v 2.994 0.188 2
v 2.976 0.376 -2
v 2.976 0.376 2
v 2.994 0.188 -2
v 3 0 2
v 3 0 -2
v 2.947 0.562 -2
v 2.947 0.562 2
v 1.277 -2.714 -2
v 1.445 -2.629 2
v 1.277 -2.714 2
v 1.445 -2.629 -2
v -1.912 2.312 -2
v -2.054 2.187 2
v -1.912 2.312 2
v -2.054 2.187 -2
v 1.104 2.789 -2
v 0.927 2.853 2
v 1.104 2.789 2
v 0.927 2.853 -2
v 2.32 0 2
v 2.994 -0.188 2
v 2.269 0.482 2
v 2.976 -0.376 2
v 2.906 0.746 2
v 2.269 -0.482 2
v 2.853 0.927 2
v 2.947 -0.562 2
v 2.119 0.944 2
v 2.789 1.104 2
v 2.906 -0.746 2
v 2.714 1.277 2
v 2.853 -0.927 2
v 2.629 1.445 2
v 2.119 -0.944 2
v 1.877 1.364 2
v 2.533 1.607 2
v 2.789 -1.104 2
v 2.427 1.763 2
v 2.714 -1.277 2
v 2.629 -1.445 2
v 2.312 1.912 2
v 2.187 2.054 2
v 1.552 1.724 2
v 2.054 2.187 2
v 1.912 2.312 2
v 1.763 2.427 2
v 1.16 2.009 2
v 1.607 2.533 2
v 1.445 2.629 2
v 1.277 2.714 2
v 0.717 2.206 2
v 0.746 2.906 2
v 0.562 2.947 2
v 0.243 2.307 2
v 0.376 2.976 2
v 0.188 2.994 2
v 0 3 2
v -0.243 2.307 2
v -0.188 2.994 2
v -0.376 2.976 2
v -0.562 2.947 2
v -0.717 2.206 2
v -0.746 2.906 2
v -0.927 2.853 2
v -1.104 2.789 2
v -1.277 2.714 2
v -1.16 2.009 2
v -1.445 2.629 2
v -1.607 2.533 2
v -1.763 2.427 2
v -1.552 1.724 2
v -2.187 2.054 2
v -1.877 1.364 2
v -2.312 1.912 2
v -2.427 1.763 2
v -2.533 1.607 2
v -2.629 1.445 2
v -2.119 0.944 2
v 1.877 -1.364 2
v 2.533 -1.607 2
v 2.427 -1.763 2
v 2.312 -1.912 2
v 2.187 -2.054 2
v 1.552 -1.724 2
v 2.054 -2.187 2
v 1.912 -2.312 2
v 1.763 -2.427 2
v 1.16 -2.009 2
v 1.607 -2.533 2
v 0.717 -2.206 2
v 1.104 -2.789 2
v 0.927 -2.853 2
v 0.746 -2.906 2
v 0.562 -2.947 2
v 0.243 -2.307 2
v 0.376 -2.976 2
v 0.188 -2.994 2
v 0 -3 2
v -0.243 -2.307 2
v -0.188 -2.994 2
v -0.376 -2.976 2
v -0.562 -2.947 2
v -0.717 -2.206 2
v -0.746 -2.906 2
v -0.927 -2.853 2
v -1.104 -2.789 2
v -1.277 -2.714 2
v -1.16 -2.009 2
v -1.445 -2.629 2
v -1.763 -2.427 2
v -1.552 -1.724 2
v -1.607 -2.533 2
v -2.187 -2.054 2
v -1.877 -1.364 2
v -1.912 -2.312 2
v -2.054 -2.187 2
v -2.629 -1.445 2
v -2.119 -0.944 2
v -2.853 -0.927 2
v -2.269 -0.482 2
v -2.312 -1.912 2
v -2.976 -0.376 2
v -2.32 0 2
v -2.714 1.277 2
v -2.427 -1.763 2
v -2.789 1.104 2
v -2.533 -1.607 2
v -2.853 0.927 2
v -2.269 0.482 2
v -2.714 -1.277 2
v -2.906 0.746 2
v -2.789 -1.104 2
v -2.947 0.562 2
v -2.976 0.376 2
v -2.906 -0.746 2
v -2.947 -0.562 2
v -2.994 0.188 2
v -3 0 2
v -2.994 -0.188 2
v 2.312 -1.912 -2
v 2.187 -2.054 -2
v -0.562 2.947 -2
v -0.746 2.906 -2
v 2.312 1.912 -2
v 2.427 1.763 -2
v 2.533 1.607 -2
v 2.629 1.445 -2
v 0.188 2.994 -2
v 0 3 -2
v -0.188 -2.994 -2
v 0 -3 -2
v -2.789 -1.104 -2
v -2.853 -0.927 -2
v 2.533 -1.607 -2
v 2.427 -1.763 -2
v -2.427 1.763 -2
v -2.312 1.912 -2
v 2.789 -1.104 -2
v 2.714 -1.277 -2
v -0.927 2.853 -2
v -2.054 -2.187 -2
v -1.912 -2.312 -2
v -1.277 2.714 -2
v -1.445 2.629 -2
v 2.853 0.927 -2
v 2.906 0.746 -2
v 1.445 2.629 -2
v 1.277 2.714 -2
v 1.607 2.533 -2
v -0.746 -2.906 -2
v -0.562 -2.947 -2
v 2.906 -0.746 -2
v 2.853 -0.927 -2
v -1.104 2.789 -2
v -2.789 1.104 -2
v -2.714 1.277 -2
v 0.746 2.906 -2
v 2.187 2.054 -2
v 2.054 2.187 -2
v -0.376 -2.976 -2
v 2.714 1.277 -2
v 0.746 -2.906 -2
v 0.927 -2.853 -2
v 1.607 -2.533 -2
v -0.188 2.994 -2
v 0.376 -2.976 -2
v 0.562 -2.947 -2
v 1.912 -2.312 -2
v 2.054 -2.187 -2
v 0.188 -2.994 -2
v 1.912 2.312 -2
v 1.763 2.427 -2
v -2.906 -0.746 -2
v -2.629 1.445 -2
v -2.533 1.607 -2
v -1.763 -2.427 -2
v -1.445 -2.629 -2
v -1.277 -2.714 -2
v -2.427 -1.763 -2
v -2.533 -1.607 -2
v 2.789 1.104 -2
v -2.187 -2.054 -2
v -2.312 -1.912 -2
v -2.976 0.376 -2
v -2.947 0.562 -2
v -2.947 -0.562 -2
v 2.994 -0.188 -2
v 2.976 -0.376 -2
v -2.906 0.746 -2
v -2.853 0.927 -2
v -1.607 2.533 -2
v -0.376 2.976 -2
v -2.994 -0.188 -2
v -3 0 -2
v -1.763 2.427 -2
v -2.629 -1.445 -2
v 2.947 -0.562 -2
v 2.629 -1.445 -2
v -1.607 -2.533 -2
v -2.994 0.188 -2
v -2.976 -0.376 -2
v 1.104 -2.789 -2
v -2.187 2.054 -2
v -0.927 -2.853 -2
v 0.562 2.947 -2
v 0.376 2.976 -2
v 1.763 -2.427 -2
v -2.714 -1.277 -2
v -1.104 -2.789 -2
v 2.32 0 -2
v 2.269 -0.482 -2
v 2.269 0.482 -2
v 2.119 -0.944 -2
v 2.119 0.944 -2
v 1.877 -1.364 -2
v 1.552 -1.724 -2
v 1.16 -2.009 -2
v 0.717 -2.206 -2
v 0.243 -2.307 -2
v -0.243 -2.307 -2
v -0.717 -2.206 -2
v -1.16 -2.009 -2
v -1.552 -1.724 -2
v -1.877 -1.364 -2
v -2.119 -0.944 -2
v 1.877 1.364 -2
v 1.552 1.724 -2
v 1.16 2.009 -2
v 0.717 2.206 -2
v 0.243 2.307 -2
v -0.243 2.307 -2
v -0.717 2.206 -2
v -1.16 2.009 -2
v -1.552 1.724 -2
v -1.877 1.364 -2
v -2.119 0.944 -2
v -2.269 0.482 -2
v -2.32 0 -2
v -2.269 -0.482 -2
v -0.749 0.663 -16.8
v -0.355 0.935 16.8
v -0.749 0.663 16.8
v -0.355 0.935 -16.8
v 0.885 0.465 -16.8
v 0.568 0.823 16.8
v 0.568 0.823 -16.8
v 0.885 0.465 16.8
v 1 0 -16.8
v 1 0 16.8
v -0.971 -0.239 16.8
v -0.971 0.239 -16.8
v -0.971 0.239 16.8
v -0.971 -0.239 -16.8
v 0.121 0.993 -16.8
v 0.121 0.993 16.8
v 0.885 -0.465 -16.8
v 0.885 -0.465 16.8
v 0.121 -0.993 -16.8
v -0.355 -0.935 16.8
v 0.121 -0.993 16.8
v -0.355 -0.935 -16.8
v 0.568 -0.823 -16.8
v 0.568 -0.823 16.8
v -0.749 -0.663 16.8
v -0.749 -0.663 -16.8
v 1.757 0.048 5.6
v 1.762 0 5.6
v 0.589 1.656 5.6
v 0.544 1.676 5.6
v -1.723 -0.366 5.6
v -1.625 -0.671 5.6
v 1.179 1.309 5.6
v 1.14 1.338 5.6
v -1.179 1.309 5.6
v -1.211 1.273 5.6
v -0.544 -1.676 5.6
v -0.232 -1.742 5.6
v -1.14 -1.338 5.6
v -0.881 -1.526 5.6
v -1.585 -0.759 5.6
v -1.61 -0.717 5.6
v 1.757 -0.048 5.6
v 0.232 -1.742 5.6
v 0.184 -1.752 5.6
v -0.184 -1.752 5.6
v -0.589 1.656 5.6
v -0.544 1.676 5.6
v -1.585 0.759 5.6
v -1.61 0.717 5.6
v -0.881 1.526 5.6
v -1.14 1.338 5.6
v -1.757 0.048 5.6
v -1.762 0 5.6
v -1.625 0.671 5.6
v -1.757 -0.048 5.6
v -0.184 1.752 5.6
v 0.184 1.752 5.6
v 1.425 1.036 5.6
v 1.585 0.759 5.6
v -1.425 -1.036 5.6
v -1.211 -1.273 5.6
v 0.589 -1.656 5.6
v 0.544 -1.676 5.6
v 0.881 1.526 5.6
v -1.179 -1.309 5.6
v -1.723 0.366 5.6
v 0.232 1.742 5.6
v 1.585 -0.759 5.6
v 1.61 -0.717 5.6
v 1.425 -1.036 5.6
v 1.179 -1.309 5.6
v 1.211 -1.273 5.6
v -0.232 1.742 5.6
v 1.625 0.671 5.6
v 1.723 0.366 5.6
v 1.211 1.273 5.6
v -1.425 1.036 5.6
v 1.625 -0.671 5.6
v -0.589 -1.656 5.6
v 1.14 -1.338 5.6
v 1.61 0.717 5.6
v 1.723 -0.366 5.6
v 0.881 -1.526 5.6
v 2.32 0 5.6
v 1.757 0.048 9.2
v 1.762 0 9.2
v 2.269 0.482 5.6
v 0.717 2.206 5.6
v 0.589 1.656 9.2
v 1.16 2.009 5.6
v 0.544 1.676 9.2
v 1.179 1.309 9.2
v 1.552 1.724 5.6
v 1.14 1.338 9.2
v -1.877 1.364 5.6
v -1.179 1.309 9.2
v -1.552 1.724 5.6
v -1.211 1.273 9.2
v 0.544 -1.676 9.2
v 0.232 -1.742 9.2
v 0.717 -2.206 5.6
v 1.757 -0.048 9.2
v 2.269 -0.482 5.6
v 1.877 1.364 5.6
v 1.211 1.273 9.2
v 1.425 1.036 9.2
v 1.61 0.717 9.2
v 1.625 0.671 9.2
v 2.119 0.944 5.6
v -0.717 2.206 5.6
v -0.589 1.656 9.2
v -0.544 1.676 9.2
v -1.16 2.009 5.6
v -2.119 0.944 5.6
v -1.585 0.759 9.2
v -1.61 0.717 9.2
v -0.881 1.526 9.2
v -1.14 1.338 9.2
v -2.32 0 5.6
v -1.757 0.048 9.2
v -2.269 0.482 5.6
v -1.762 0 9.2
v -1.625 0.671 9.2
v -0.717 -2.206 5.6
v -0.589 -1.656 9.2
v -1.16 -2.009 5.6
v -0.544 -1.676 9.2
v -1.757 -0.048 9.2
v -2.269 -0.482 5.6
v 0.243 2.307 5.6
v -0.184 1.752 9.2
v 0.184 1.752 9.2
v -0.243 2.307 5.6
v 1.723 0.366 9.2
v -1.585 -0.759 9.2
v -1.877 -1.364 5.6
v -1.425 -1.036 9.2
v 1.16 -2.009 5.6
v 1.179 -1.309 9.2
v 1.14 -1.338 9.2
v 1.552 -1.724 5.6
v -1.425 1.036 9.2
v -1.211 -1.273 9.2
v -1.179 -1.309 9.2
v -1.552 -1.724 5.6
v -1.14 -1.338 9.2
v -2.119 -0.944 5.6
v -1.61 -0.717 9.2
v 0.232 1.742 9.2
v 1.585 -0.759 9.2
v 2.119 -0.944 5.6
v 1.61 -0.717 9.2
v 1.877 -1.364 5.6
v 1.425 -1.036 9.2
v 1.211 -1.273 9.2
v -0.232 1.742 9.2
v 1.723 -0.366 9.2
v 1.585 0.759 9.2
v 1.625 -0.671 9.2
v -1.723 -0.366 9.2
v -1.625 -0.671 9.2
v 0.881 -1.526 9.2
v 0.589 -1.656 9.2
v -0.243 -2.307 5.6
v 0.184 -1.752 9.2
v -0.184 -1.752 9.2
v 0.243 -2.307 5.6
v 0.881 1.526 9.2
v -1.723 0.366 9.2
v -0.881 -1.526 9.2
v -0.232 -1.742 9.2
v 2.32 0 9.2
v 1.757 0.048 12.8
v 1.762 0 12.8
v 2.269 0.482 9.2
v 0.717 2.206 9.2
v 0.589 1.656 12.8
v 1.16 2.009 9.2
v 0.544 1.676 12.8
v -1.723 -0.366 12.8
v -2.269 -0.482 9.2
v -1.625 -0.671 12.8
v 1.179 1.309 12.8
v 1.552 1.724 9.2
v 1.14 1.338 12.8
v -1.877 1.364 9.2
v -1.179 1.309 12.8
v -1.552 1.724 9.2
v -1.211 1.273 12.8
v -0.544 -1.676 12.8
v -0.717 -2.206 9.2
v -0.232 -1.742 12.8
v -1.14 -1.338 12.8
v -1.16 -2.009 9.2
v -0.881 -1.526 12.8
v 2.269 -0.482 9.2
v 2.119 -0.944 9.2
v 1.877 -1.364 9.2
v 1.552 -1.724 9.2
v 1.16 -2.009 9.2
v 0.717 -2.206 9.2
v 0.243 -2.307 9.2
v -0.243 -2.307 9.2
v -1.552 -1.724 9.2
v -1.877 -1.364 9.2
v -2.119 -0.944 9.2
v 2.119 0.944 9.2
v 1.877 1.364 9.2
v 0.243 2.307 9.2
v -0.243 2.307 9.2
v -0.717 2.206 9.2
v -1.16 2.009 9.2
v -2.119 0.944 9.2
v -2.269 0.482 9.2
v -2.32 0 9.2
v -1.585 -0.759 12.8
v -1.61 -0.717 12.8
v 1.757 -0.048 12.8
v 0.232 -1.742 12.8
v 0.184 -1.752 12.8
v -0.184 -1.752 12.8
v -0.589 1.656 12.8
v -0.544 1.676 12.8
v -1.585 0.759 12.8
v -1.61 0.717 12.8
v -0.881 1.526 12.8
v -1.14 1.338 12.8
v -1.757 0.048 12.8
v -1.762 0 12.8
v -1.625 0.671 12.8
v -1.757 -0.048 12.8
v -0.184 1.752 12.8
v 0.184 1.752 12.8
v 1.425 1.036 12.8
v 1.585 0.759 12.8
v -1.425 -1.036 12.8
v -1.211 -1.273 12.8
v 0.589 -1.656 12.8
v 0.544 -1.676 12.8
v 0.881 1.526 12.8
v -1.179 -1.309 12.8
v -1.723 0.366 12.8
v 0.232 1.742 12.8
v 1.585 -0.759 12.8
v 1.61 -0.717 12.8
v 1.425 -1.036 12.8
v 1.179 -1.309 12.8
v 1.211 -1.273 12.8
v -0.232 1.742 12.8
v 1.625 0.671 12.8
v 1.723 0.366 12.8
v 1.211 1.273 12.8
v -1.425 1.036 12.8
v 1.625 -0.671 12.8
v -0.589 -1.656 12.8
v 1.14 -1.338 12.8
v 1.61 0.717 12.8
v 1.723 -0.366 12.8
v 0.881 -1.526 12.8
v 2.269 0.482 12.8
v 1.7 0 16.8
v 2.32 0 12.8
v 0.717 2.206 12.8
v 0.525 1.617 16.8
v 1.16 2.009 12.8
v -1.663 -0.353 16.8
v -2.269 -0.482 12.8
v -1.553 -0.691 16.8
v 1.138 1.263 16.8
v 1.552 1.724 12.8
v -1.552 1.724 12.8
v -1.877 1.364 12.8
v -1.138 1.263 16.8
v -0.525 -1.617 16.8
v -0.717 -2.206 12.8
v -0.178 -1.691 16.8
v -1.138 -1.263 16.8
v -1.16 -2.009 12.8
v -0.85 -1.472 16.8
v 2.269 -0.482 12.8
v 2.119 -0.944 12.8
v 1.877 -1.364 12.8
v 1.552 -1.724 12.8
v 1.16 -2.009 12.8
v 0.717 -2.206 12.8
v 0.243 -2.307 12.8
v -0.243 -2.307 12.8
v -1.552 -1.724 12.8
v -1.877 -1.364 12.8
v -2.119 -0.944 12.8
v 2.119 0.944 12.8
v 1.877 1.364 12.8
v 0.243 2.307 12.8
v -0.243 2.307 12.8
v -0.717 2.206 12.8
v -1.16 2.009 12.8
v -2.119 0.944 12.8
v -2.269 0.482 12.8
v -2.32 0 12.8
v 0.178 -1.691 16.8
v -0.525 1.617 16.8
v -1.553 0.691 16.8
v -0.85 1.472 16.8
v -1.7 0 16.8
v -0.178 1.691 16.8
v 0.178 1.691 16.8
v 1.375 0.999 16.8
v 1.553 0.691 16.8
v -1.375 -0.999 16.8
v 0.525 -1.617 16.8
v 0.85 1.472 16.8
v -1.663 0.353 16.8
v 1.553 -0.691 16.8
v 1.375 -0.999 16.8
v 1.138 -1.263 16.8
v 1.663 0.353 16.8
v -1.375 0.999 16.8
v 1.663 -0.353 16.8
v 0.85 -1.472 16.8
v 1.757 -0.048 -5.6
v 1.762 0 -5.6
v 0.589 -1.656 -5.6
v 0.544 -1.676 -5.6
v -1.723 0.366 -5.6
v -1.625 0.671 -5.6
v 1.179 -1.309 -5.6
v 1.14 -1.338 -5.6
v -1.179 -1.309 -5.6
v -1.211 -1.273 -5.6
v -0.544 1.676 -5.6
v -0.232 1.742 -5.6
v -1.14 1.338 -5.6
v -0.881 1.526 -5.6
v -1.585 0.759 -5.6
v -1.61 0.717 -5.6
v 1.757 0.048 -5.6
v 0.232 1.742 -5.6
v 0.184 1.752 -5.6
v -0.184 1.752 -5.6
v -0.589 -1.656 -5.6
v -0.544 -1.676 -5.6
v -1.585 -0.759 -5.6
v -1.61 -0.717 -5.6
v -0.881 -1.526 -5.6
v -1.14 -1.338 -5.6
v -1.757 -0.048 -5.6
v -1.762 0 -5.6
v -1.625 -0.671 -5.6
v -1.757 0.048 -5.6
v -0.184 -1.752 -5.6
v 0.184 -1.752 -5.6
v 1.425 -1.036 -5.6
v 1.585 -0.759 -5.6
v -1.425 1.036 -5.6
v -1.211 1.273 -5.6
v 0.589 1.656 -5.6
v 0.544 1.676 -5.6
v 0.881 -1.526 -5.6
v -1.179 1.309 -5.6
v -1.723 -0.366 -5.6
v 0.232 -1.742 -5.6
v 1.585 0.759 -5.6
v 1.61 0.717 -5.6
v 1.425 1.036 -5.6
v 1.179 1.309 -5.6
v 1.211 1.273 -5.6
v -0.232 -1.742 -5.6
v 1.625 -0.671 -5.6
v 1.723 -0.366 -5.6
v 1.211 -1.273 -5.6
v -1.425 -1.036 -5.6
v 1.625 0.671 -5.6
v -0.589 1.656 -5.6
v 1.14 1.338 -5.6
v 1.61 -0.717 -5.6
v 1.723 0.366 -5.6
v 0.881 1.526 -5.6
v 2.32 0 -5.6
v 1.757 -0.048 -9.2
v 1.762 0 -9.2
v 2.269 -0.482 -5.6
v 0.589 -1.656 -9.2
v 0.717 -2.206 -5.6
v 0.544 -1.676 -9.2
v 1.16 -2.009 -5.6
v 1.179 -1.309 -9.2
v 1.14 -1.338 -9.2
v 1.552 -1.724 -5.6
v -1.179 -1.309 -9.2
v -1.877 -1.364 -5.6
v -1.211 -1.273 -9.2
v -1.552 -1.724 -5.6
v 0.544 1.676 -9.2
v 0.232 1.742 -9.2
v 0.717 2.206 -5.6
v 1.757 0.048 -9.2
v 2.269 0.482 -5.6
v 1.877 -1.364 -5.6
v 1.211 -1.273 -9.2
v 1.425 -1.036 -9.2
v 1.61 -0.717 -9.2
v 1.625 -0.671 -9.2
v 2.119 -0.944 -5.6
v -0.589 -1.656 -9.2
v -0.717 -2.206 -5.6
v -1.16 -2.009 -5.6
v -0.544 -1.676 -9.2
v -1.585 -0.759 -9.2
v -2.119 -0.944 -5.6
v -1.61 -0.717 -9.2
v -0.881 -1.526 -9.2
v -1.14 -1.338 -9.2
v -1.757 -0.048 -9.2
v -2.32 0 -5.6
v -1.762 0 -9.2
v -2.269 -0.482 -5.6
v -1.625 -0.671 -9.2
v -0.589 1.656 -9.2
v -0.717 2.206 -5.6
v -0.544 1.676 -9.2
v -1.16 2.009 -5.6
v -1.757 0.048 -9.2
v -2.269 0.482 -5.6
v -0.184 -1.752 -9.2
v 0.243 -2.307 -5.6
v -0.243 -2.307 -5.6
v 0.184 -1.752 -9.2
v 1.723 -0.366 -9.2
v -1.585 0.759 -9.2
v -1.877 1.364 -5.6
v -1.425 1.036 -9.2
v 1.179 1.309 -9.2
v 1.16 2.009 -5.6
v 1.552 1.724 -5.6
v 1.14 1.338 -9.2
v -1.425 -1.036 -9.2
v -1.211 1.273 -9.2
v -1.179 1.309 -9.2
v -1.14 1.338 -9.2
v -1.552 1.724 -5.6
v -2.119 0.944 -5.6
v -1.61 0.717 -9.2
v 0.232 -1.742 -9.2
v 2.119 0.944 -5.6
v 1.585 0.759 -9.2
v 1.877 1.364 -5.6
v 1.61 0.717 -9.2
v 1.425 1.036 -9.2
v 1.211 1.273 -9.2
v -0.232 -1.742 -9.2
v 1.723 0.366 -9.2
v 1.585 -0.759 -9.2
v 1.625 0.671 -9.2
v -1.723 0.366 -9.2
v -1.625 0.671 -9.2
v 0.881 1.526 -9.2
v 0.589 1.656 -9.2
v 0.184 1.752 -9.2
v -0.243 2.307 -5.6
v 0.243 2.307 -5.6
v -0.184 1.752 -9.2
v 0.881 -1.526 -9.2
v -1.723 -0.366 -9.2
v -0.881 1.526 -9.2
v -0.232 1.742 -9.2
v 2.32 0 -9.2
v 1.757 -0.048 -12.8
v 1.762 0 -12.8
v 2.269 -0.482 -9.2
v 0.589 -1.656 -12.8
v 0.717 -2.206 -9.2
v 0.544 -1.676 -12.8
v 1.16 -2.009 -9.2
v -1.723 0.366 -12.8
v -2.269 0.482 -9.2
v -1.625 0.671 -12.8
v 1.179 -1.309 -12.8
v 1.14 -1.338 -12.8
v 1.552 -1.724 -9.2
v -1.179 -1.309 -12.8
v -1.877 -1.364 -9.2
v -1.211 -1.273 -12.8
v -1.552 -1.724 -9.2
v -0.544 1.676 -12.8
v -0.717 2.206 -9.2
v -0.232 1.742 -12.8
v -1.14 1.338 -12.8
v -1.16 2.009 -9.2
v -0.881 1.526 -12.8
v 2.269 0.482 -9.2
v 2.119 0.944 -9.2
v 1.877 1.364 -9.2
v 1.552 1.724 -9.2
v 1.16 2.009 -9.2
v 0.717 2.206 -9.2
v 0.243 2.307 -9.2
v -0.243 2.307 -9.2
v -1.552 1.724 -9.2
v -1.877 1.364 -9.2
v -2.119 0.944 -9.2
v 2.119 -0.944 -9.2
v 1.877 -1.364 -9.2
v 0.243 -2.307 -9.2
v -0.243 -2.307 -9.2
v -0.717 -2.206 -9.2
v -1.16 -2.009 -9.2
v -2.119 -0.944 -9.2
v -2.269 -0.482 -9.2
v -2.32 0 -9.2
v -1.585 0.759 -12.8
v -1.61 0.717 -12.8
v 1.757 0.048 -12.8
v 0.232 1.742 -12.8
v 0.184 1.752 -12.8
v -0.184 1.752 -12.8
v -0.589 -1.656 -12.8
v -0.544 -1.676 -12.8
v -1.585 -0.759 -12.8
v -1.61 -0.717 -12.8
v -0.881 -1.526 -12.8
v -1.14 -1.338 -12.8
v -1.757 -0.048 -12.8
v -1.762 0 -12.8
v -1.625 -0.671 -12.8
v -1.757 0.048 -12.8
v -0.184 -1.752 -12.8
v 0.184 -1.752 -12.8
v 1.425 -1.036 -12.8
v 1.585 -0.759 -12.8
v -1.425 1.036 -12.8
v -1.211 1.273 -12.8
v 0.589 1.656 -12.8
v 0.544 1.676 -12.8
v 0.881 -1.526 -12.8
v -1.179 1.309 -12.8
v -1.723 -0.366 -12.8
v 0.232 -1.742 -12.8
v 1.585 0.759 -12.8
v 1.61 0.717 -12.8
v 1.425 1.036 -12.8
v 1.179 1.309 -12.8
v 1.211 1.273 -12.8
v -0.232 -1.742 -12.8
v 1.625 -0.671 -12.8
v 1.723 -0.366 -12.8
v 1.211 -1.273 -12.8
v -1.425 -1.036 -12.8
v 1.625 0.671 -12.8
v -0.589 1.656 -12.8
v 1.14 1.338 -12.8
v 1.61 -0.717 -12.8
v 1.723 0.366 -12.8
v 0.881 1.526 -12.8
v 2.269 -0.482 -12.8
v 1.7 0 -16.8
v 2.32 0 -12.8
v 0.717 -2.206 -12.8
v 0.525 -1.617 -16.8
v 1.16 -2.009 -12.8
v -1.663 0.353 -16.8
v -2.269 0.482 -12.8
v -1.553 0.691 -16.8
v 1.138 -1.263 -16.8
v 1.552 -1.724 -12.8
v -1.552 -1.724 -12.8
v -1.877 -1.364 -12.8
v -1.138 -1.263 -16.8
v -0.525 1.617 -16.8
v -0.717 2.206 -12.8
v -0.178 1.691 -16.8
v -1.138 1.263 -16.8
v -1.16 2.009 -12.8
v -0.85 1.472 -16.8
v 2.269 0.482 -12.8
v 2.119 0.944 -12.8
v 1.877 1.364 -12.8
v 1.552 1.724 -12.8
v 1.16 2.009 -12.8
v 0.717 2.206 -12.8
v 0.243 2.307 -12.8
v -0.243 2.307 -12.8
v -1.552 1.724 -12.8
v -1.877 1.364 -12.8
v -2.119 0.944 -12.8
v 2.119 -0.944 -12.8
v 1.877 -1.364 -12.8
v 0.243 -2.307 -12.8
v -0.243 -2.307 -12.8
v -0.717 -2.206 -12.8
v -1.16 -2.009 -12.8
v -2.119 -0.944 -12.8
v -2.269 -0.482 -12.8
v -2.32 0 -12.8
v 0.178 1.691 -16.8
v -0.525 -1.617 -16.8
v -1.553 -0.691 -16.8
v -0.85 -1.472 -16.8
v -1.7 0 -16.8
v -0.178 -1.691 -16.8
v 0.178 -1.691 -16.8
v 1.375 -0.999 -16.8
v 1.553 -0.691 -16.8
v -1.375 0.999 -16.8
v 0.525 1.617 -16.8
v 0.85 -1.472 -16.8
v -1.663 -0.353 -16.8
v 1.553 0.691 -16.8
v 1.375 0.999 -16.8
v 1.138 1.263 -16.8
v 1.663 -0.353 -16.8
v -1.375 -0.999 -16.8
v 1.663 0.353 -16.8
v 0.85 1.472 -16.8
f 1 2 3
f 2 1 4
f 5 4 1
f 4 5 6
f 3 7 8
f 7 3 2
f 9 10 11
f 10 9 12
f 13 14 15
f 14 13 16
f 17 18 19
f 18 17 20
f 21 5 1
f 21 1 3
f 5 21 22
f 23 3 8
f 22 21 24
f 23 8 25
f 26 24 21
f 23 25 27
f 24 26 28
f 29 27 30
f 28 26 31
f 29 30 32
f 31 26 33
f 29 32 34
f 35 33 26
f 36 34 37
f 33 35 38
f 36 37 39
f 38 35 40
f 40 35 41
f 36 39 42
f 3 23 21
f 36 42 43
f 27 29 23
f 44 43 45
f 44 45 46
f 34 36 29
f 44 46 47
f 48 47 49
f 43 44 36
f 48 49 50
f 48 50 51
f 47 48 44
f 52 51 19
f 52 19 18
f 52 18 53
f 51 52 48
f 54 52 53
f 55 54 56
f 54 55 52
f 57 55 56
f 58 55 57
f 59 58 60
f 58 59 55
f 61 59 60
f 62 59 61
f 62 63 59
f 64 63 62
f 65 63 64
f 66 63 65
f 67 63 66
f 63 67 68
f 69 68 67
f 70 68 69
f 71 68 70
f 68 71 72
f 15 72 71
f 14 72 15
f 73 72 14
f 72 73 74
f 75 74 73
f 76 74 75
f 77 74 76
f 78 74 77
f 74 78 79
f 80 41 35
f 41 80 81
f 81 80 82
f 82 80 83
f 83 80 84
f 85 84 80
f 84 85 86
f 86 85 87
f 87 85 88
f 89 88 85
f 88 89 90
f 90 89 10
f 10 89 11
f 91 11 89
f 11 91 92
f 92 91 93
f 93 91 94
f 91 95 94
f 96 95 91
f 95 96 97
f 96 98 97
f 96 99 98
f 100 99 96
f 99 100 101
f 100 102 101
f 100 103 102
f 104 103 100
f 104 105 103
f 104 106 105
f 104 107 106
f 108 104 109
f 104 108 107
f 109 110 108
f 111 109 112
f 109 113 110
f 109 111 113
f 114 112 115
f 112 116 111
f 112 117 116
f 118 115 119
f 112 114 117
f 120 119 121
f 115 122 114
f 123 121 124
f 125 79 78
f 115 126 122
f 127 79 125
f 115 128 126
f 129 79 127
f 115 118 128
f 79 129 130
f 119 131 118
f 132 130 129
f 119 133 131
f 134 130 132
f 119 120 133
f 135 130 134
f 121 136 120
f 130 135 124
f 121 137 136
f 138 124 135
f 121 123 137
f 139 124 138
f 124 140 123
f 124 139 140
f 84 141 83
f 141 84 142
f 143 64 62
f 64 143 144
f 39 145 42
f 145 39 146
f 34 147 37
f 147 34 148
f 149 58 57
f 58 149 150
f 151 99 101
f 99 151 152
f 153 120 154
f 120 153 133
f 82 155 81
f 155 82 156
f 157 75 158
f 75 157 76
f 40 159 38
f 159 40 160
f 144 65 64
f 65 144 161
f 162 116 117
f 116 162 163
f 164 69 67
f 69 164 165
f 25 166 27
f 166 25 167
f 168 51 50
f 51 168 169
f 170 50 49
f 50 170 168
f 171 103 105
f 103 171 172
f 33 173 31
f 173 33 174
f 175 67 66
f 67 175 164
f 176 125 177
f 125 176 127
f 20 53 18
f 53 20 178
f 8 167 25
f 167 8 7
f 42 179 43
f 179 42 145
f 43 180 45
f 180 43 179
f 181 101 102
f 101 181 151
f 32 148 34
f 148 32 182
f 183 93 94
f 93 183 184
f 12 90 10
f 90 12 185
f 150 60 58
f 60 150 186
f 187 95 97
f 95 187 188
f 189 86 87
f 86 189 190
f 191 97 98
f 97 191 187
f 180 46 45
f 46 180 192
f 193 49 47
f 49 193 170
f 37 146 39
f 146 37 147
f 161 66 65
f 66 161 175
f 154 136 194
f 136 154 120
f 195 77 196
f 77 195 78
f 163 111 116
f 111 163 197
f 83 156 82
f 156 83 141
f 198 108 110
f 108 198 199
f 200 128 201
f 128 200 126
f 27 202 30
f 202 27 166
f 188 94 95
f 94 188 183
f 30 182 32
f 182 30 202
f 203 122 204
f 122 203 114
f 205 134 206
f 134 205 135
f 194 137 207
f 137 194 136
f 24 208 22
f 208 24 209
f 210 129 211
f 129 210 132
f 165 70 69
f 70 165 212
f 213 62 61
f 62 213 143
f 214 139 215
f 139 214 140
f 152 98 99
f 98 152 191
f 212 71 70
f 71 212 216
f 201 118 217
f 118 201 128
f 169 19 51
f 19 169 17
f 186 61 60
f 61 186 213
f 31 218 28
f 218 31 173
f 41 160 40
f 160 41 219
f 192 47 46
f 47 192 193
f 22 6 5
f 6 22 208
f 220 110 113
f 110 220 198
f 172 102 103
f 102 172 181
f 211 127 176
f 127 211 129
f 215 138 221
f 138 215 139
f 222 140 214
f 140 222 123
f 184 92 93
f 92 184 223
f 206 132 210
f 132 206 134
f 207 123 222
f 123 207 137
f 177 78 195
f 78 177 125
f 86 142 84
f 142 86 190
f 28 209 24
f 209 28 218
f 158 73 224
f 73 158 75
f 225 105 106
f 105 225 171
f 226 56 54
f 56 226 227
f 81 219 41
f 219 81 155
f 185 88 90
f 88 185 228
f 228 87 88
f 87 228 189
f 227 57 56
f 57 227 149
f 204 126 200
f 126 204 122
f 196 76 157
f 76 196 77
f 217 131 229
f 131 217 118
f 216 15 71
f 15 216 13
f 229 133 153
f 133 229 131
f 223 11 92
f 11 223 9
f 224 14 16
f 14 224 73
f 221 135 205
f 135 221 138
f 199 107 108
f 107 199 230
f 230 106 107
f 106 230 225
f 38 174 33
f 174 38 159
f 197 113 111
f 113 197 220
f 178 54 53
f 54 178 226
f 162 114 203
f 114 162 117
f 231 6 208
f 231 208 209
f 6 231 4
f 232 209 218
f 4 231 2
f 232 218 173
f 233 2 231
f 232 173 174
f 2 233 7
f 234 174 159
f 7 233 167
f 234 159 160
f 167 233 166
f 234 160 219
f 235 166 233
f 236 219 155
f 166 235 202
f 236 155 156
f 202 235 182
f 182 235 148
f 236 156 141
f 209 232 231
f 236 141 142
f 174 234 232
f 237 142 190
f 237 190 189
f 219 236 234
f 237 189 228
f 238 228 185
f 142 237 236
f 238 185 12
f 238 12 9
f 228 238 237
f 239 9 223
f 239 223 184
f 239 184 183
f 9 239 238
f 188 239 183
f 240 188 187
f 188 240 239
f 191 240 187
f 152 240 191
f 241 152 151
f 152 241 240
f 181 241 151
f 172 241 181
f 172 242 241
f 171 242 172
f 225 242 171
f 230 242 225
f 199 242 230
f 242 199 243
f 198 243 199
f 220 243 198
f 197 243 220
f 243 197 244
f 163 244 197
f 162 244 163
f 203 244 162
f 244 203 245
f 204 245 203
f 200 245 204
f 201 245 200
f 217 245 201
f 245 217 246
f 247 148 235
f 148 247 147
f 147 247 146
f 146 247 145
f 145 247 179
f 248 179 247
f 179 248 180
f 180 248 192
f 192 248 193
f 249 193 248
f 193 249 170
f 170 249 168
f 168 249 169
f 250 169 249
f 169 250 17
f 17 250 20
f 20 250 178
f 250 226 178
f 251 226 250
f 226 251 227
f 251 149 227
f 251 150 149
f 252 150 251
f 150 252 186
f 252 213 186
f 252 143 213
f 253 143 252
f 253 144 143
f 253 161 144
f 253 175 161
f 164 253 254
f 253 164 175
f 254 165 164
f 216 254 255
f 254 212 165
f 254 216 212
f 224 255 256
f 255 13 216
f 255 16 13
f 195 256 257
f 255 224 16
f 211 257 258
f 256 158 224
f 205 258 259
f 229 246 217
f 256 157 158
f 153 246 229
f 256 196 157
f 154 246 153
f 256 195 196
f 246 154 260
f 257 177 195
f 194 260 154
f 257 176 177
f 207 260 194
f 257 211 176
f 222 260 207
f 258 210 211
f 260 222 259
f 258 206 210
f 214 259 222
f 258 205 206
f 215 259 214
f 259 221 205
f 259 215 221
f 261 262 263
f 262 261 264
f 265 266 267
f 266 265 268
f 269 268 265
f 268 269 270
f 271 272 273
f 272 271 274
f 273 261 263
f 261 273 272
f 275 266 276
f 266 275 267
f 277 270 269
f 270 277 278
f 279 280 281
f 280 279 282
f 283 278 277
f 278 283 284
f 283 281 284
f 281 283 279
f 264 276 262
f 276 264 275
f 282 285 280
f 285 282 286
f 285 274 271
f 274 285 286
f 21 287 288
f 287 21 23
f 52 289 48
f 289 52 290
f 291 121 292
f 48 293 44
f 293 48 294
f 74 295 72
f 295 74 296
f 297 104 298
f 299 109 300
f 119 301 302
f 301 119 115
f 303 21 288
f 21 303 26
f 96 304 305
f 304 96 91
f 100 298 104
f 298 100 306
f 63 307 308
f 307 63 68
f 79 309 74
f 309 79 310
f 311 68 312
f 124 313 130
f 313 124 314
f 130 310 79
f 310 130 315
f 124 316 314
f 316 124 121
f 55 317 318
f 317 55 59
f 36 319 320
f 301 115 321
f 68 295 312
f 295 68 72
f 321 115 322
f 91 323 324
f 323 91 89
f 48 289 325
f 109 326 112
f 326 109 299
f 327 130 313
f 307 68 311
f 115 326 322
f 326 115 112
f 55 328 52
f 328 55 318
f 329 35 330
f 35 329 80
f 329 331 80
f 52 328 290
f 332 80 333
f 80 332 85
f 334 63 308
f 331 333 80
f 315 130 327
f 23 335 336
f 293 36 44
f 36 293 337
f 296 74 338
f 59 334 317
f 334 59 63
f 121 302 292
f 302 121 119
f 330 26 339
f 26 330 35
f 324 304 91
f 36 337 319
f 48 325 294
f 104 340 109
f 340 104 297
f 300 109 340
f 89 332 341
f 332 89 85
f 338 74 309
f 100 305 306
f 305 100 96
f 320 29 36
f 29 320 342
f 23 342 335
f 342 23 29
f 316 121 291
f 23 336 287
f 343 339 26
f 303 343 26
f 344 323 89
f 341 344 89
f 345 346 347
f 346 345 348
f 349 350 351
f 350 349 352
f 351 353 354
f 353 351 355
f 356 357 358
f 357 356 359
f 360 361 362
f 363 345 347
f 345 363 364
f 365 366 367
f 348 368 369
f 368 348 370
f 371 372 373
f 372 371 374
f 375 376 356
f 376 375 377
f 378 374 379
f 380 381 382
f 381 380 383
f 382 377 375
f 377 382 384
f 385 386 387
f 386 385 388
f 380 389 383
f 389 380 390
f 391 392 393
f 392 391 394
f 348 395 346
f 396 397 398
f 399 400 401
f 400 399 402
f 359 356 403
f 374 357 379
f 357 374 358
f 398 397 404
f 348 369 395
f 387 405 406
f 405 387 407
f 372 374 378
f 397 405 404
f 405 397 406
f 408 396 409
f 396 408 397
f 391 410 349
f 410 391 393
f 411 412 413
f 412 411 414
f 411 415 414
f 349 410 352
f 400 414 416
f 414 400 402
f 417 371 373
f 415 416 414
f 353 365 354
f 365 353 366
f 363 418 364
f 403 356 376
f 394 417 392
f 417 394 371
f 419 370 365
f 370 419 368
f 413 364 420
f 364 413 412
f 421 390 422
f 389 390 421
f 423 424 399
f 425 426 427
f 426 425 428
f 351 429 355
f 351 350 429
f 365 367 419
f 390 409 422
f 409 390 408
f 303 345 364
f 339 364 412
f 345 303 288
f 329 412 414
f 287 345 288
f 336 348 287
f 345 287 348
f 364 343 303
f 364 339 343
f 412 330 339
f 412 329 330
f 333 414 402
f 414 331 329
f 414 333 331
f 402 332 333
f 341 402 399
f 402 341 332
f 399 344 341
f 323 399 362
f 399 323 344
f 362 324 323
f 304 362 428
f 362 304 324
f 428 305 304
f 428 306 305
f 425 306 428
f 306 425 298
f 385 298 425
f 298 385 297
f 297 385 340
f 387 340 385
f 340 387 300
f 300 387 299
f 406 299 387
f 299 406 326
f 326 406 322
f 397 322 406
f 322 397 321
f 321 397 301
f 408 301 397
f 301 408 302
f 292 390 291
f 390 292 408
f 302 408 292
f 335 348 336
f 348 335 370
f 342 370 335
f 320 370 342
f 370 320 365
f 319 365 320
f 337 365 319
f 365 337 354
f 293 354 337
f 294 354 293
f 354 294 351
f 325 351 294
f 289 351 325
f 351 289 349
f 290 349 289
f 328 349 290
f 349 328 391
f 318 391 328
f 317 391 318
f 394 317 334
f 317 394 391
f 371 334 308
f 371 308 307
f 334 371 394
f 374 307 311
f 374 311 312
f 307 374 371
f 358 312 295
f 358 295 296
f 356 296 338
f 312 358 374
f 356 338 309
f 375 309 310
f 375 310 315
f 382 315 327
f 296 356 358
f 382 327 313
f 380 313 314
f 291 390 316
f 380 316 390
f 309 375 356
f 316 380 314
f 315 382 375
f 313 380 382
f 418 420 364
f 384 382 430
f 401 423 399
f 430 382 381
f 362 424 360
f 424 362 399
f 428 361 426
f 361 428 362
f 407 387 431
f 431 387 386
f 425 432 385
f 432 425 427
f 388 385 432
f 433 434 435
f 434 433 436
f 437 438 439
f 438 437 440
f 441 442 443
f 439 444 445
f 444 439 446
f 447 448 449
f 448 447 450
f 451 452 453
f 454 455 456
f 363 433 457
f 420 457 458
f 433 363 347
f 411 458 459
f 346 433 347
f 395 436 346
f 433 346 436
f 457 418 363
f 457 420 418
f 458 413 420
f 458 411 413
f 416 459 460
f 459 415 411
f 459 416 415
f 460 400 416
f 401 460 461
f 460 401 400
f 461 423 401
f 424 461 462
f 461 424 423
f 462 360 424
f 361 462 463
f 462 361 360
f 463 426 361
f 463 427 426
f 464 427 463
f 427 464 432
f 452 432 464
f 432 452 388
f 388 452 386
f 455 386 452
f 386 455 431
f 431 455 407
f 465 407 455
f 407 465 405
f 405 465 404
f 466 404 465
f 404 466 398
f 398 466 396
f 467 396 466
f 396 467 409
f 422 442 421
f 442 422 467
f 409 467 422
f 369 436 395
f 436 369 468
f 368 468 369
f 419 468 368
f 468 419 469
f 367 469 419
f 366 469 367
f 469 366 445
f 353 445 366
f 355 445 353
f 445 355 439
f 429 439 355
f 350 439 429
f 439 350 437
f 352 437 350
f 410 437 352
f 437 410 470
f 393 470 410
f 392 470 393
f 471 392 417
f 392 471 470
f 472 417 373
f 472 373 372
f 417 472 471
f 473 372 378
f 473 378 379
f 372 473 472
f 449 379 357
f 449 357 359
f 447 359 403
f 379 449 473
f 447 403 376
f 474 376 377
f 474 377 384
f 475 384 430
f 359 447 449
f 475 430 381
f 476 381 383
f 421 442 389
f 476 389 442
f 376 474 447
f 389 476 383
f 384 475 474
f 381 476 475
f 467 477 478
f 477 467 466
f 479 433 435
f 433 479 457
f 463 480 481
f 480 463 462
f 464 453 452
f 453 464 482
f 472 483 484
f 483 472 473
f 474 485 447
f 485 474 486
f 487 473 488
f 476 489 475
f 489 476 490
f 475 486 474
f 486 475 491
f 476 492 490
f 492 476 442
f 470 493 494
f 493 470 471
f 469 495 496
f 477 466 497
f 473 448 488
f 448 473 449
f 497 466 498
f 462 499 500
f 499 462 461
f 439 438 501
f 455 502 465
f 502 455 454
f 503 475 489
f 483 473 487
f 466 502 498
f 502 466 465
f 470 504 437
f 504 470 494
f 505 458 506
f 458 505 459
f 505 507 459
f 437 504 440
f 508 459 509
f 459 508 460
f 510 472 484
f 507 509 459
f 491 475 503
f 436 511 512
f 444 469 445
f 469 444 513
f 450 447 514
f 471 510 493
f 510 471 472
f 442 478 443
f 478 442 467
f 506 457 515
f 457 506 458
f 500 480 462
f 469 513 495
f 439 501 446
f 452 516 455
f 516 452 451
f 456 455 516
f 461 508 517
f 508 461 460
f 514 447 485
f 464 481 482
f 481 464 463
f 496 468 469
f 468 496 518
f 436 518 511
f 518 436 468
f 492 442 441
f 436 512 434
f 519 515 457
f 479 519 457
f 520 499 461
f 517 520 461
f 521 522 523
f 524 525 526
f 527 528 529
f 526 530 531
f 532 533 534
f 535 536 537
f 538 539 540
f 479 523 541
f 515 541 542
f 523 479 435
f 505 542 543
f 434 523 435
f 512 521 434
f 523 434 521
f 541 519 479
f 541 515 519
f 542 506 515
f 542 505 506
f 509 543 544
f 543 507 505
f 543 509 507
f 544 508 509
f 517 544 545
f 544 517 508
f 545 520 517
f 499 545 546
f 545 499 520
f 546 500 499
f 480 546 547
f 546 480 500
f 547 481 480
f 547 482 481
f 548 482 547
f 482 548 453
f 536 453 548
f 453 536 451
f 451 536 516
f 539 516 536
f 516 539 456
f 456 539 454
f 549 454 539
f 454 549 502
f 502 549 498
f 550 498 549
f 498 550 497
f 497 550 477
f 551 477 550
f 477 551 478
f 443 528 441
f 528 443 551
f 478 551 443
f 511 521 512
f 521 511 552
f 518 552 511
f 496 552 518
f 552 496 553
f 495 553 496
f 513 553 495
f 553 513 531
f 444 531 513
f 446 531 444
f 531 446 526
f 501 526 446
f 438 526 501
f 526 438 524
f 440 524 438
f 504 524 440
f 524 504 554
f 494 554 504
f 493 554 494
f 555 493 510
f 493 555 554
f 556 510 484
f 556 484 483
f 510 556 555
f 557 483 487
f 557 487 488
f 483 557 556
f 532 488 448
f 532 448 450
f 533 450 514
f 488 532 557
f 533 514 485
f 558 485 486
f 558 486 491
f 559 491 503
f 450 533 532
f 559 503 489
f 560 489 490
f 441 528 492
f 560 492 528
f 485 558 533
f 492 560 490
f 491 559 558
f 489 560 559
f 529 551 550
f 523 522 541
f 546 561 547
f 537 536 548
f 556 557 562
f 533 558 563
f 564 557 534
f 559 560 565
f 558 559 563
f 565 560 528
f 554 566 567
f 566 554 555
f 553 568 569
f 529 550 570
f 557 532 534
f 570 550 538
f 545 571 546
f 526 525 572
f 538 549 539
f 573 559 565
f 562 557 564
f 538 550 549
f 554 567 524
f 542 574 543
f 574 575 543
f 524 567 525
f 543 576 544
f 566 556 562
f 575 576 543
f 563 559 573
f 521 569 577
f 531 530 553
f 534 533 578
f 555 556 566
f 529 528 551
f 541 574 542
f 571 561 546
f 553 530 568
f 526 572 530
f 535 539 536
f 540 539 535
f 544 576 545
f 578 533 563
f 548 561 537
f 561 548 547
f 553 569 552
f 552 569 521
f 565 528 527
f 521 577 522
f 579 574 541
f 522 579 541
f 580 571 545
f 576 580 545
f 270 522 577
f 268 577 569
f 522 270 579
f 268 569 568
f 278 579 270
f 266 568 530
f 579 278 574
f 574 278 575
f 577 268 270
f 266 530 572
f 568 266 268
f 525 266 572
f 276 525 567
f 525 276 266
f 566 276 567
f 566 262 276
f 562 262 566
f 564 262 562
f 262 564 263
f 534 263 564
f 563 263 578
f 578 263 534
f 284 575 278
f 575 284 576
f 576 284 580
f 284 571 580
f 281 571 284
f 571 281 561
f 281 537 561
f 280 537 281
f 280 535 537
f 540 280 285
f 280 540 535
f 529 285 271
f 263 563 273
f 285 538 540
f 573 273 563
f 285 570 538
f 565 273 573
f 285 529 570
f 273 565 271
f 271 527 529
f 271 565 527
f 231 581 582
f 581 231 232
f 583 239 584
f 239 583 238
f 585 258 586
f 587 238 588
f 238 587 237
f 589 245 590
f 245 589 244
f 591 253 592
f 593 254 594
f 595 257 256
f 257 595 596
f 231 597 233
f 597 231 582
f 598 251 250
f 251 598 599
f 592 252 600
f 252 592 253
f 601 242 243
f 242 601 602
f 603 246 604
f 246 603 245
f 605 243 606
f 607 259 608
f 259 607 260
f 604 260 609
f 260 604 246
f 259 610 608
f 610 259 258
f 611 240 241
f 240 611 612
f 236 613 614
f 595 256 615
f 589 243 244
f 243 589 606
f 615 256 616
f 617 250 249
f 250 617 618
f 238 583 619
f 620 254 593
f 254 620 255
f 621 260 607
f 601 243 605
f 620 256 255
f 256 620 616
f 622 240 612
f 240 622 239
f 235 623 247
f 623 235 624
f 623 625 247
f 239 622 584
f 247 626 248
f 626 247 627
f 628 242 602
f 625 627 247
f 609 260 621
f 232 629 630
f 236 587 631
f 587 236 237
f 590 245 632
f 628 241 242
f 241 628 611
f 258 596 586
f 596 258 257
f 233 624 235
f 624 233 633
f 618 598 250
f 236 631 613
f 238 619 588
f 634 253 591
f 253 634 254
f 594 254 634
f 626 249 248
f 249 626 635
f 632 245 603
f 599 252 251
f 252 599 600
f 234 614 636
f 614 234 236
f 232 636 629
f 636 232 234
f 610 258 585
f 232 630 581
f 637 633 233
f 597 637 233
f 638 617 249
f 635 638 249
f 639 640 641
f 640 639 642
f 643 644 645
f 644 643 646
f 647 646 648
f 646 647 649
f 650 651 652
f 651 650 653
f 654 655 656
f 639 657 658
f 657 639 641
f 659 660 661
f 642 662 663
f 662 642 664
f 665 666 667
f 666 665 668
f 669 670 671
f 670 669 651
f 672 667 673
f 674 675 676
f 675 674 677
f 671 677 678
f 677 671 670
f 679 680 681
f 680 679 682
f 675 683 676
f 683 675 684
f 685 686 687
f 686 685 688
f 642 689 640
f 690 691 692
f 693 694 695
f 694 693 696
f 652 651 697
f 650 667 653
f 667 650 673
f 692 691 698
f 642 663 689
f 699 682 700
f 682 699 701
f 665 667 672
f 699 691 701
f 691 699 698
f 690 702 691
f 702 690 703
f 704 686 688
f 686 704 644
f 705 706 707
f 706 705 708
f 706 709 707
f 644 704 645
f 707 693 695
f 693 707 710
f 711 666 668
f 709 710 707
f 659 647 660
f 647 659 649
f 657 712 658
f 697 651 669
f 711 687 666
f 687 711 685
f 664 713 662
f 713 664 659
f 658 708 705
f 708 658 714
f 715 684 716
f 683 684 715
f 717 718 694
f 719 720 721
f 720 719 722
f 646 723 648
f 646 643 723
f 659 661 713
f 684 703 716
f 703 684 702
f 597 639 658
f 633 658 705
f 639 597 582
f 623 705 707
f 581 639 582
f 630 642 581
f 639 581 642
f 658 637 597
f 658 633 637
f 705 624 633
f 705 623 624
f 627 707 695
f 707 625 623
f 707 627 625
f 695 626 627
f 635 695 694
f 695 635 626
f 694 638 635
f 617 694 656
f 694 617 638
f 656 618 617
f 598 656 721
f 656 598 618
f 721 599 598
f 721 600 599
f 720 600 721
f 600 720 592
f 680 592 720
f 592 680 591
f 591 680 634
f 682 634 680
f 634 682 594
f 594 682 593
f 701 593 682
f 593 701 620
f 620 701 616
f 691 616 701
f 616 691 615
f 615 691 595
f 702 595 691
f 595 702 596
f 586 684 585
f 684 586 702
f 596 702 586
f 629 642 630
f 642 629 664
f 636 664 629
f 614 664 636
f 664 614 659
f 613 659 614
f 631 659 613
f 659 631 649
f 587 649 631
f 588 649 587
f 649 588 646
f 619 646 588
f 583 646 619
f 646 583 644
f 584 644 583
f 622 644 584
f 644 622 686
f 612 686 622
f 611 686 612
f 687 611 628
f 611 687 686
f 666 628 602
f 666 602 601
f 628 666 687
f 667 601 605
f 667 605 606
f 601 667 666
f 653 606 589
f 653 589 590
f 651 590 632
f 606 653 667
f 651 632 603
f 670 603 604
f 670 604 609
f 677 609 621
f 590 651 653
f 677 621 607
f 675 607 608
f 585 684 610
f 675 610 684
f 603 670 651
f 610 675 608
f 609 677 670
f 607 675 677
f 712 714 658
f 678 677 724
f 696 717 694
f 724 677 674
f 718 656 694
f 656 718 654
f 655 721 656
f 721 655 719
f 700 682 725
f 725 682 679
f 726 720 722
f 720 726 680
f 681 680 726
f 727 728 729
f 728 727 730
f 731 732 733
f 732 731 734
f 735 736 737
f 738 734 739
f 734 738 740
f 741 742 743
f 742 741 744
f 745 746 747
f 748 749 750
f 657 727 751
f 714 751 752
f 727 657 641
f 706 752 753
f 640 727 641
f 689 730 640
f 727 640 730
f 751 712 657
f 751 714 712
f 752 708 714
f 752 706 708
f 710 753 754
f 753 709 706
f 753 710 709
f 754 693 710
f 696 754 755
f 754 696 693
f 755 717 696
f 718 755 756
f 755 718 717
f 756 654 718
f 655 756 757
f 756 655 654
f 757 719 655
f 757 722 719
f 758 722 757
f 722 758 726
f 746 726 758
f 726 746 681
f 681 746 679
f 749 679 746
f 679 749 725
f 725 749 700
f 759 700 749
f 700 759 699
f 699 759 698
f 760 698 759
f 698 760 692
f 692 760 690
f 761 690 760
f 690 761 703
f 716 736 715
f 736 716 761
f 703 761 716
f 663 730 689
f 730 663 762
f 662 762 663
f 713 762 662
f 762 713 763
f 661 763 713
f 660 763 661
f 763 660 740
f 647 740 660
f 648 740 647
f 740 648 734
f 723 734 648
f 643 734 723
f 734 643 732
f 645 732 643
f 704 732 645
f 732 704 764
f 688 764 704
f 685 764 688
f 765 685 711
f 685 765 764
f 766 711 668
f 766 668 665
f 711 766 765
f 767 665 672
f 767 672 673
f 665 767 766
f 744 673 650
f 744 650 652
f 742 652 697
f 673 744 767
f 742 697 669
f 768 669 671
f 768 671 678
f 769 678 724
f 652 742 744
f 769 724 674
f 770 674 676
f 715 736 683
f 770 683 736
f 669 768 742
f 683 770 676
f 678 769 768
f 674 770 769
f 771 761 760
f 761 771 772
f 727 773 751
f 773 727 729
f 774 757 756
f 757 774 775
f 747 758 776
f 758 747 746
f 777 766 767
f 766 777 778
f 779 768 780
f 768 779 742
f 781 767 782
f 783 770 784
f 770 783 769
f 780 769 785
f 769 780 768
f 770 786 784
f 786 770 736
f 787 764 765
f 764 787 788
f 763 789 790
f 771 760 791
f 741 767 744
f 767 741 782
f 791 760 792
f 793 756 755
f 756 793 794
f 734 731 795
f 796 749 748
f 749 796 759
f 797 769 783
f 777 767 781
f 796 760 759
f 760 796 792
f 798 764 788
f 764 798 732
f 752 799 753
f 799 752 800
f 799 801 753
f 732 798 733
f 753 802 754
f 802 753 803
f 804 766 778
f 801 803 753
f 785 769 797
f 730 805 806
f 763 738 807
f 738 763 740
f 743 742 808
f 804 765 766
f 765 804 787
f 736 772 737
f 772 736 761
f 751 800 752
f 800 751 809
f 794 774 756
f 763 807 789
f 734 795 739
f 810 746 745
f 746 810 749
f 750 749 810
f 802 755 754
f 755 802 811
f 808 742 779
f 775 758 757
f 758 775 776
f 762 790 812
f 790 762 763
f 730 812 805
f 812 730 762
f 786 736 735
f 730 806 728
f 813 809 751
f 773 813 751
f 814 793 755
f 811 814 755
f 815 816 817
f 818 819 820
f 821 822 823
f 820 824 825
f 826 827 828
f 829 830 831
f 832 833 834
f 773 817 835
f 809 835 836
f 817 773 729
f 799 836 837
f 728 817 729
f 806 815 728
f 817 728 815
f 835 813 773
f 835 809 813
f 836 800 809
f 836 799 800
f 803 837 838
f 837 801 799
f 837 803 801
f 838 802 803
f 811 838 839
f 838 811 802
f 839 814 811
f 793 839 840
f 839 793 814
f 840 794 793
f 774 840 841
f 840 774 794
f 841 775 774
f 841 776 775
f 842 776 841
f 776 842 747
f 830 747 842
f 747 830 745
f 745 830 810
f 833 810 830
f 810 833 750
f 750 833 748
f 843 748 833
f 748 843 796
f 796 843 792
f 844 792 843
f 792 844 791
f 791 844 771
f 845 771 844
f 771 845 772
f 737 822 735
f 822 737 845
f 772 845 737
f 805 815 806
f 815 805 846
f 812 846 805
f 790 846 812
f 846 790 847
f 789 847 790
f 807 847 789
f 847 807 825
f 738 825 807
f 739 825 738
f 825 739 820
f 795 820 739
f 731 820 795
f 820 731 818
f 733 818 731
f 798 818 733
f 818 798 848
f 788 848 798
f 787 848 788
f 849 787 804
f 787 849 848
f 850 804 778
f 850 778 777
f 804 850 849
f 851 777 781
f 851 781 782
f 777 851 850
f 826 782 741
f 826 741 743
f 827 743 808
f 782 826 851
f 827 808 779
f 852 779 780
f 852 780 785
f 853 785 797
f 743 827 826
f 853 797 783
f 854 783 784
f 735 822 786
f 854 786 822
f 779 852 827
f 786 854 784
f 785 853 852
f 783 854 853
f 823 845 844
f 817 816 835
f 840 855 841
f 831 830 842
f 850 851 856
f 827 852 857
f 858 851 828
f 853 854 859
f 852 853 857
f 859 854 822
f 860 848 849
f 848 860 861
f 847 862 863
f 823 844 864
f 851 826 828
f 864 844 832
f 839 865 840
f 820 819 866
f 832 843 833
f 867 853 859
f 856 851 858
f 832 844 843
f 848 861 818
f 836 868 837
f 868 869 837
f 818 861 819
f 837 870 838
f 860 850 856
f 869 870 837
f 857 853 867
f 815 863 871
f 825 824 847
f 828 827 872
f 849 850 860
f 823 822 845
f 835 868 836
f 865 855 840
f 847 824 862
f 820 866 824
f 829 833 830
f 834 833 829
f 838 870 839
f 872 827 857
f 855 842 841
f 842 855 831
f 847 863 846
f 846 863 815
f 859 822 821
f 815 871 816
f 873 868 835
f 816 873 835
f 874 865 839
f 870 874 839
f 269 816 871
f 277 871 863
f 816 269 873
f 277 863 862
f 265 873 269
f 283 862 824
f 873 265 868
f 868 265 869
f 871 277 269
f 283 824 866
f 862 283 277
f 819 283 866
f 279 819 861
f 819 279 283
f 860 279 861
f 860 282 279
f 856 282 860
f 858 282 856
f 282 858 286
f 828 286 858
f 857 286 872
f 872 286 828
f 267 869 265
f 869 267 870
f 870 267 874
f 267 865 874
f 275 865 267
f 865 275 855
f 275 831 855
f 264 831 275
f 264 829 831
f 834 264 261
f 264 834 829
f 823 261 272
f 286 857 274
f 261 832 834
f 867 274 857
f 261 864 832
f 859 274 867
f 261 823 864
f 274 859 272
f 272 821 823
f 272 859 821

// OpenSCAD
/*
Adapted from: Hose barb adapter and manifold by papergeek  www.thingiverse.com/thing:158717


This version gives you a few different options you can change the shape of the middle section on a two way connector so that it is round or hex shaped. the option to add multiple connections in two different sizes.

update 5/3/2016

Added the option to create a "L" shaped two way connection.

*/
// Number of tubes size A's to connect. 
Number_of_Size_A = 2;
// Number of tubes size B's to connect. Size A should be the smaller hose
Number_of_Size_B = 0;

// Hose A inside diameter or bore
Size_A = 4; 
// Hose B inside diameter or bore
Size_B = 8; 

// Manifold Bore = Size - Wall Thickness thicker walls are stronger but have a smaller bore. 
// Wall_Thickness_n must be less than Size_n

// Wall_Thickness_A must be less than Size_A
Wall_Thickness_A = 1;
// Wall_Thickness_B must be less than Size_B
Wall_Thickness_B = 1;

// on 3 and 4 port connectors you can choose if the manifold is square "T" or polygon "Y" OR "L" for a two port connector at right angles
junction_type = "T"; // [Y, T, L]

// Number of barbs on output - try 3 for larger tubing to reduce overall print height try 4 for smaller tubing
Size_A_barb_count = 4;
Size_B_barb_count = 3;

// For 2 port(inline) connectors the shoulder can be hexagional to fit a spanner or round
Inline_Connector = "round"; // [round, hex]
// Size across the flats of the Hex
Hex_Size = 8; 
// How much shoulder overhanging the largest port on round inline connectors.
Shoulder = 1;


// Hidden Variables used throught the sketch dont't sugest changing these
Size_A_Bore = Size_A - (Wall_Thickness_A * 2);
Size_B_Bore = Size_B - (Wall_Thickness_B * 2);
//change manifold to hex shaped
Edges = Inline_Connector == "hex" ? 6 : 100 ; 

Number_of_Faces = Number_of_Size_A + Number_of_Size_B;


// create inline connector
if (Number_of_Faces == 2 && junction_type !="L")
{
  Size = Number_of_Size_A == 2 ? Size_A : Size_B ;
  HYP = (Hex_Size / 2) / cos(30);
  Size_1 = Inline_Connector == "hex" ? (HYP * 2) : (Size + 2*Shoulder) ; // size of manifols 
  Bore_1 = Number_of_Size_A > 1 ? Size_A_Bore : Size_B_Bore ; 
  Bore_2 = Number_of_Size_A > 0 ? Size_A_Bore : Size_B_Bore ;

  union()
  {
    difference()
    {
      cylinder( h = Size , d = Size_1, center = true, $fa = 0.5, $fs = 0.5, $fn = Edges )  ;
      cylinder(h = Size + 1, d1 = Bore_1, d2 = Bore_2, center = true, $fa = 0.5, $fs = 0.5 );
    }

// Top port
    translate([0, 0, Size / 2])
    {
      if (Number_of_Size_A > 0)
      {
        connector_size_A();
      }
      else
      {
        connector_size_B();
      }
    }
// Bottom port
    translate([0, 0, -Size / 2])rotate([180, 0, 0])
    {
      if (Number_of_Size_A == 2)
      {
        connector_size_A();
      }
      else
      {
        connector_size_B();
      }
    }
  }
}

// Multi port manifold

if (Number_of_Faces > 2 || junction_type == "L")
{
  Port_Height = Number_of_Size_B > 0 ? Size_B : Size_A ;
  Port_Bore = Number_of_Size_B > 0 ? Size_B_Bore : Size_A_Bore;
  Face_Height = Port_Height * 1.5;

  junction = Number_of_Faces > 4 ? "Y" : junction_type  ;
  Smooth = Inline_Connector == "round" ? Number_of_Faces + 100 : Number_of_Faces;

  angleA = (360 / (Number_of_Size_A + Number_of_Size_B));
  angleB = 90;
  angle = junction == "Y" ? angleA : angleB ;

      /*  To calculate the Apothem (or radius of a polygon's inner circle)
        Apothem = R * Cos *(180/N)

          where:
          R = radius of polygons outer circle or circumcircle
          N = number of sides/faces
    */
  Radius = (Port_Height* 1.16 ) / (2 * sin(180 / Number_of_Faces));
  Apothem  = junction == "L" ? Port_Height* 1.16 : (Radius + 4) * cos(180 / Number_of_Faces) ;
//  Apothem = (Radius + 4) * cos(180 / Number_of_Faces);



// create body of manifold  
  union()
  {
    difference()
    {
      if ( junction == "Y")
      {
        rotate([0, 0, angle / 2])cylinder( h = Face_Height , r = Radius + 4, center = true, $fa = 0.5, $fs = 0.5, $fn = Smooth )  ;
      }
      if (junction == "T")
      {
        cube( Apothem *2 , center = true, $fa = 0.5, $fs = 0.5);
      }
      if ( junction == "L")
      {
        cube( Apothem * 2 , center = true, $fa = 0.5, $fs = 0.5);
      }
      
      cylinder( h = Port_Bore , d = Port_Height, center = true, $fa = 0.5, $fs = 0.5, $fn = Number_of_Faces )  ;

// bore holes for the ports
      if (Number_of_Size_A > 0)
      {
        for (n = [1:Number_of_Size_A ])
        {
          rotate([angle * n, 90, 0]) cylinder( h = Apothem *2 , d = Size_A_Bore, center = false, $fa = 0.5, $fs = 0.5);
        }
      }
      if (Number_of_Size_B > 0)
      {
        for (n = [1:Number_of_Size_B  ])
        {
          rotate([(angle * n) + (angle * Number_of_Size_A), 90, 0]) cylinder( h = Apothem *2 , d = Size_B_Bore, center = false, $fa = 0.5, $fs = 0.5);
        }
      }


    }
// Add the ports
    
    if (Number_of_Size_A > 0)
    {
      for (i = [1:Number_of_Size_A ])
      {
        rotate([angle * i, 90, 0])translate([0, 0, Apothem - 0.5])  connector_size_A();
      }
    }
    if (Number_of_Size_B > 0)
    {
      for (i = [1:Number_of_Size_B ])
      {
        rotate([(angle * i) + (angle * Number_of_Size_A), 90, 0])translate([0, 0, Apothem - 0.5])  connector_size_B();
      }
    }
  }
}



module connector_size_A()
{
  difference()
  {
    union()
    {
      for ( i = [1:Size_A_barb_count])
      {
        translate([0, 0, (i - 1) * Size_A * 0.9]) cylinder( h = Size_A , r2 = Size_A * 0.85 / 2, r1 = Size_A * 1.16 / 2, $fa = 0.5, $fs = 0.5 );

      }
    }
    translate([0, 0, -0.1]) cylinder( h = Size_A * Size_A_barb_count , d = Size_A_Bore , $fa = 0.5, $fs = 0.5 );
  }
}
module connector_size_B()
{
  difference()
  {
    union()
    {
      for ( i = [1:Size_B_barb_count])
      {
        translate([0, 0, (i - 1) * Size_B * 0.9]) cylinder( h = Size_B , r2 = Size_B * 0.85 / 2, r1 = Size_B * 1.16 / 2, $fa = 0.5, $fs = 0.5 );

      }
    }
    translate([0, 0, -0.1]) cylinder( h = Size_B * Size_B_barb_count , d = Size_B_Bore , $fa = 0.5, $fs = 0.5 );
  }
}
